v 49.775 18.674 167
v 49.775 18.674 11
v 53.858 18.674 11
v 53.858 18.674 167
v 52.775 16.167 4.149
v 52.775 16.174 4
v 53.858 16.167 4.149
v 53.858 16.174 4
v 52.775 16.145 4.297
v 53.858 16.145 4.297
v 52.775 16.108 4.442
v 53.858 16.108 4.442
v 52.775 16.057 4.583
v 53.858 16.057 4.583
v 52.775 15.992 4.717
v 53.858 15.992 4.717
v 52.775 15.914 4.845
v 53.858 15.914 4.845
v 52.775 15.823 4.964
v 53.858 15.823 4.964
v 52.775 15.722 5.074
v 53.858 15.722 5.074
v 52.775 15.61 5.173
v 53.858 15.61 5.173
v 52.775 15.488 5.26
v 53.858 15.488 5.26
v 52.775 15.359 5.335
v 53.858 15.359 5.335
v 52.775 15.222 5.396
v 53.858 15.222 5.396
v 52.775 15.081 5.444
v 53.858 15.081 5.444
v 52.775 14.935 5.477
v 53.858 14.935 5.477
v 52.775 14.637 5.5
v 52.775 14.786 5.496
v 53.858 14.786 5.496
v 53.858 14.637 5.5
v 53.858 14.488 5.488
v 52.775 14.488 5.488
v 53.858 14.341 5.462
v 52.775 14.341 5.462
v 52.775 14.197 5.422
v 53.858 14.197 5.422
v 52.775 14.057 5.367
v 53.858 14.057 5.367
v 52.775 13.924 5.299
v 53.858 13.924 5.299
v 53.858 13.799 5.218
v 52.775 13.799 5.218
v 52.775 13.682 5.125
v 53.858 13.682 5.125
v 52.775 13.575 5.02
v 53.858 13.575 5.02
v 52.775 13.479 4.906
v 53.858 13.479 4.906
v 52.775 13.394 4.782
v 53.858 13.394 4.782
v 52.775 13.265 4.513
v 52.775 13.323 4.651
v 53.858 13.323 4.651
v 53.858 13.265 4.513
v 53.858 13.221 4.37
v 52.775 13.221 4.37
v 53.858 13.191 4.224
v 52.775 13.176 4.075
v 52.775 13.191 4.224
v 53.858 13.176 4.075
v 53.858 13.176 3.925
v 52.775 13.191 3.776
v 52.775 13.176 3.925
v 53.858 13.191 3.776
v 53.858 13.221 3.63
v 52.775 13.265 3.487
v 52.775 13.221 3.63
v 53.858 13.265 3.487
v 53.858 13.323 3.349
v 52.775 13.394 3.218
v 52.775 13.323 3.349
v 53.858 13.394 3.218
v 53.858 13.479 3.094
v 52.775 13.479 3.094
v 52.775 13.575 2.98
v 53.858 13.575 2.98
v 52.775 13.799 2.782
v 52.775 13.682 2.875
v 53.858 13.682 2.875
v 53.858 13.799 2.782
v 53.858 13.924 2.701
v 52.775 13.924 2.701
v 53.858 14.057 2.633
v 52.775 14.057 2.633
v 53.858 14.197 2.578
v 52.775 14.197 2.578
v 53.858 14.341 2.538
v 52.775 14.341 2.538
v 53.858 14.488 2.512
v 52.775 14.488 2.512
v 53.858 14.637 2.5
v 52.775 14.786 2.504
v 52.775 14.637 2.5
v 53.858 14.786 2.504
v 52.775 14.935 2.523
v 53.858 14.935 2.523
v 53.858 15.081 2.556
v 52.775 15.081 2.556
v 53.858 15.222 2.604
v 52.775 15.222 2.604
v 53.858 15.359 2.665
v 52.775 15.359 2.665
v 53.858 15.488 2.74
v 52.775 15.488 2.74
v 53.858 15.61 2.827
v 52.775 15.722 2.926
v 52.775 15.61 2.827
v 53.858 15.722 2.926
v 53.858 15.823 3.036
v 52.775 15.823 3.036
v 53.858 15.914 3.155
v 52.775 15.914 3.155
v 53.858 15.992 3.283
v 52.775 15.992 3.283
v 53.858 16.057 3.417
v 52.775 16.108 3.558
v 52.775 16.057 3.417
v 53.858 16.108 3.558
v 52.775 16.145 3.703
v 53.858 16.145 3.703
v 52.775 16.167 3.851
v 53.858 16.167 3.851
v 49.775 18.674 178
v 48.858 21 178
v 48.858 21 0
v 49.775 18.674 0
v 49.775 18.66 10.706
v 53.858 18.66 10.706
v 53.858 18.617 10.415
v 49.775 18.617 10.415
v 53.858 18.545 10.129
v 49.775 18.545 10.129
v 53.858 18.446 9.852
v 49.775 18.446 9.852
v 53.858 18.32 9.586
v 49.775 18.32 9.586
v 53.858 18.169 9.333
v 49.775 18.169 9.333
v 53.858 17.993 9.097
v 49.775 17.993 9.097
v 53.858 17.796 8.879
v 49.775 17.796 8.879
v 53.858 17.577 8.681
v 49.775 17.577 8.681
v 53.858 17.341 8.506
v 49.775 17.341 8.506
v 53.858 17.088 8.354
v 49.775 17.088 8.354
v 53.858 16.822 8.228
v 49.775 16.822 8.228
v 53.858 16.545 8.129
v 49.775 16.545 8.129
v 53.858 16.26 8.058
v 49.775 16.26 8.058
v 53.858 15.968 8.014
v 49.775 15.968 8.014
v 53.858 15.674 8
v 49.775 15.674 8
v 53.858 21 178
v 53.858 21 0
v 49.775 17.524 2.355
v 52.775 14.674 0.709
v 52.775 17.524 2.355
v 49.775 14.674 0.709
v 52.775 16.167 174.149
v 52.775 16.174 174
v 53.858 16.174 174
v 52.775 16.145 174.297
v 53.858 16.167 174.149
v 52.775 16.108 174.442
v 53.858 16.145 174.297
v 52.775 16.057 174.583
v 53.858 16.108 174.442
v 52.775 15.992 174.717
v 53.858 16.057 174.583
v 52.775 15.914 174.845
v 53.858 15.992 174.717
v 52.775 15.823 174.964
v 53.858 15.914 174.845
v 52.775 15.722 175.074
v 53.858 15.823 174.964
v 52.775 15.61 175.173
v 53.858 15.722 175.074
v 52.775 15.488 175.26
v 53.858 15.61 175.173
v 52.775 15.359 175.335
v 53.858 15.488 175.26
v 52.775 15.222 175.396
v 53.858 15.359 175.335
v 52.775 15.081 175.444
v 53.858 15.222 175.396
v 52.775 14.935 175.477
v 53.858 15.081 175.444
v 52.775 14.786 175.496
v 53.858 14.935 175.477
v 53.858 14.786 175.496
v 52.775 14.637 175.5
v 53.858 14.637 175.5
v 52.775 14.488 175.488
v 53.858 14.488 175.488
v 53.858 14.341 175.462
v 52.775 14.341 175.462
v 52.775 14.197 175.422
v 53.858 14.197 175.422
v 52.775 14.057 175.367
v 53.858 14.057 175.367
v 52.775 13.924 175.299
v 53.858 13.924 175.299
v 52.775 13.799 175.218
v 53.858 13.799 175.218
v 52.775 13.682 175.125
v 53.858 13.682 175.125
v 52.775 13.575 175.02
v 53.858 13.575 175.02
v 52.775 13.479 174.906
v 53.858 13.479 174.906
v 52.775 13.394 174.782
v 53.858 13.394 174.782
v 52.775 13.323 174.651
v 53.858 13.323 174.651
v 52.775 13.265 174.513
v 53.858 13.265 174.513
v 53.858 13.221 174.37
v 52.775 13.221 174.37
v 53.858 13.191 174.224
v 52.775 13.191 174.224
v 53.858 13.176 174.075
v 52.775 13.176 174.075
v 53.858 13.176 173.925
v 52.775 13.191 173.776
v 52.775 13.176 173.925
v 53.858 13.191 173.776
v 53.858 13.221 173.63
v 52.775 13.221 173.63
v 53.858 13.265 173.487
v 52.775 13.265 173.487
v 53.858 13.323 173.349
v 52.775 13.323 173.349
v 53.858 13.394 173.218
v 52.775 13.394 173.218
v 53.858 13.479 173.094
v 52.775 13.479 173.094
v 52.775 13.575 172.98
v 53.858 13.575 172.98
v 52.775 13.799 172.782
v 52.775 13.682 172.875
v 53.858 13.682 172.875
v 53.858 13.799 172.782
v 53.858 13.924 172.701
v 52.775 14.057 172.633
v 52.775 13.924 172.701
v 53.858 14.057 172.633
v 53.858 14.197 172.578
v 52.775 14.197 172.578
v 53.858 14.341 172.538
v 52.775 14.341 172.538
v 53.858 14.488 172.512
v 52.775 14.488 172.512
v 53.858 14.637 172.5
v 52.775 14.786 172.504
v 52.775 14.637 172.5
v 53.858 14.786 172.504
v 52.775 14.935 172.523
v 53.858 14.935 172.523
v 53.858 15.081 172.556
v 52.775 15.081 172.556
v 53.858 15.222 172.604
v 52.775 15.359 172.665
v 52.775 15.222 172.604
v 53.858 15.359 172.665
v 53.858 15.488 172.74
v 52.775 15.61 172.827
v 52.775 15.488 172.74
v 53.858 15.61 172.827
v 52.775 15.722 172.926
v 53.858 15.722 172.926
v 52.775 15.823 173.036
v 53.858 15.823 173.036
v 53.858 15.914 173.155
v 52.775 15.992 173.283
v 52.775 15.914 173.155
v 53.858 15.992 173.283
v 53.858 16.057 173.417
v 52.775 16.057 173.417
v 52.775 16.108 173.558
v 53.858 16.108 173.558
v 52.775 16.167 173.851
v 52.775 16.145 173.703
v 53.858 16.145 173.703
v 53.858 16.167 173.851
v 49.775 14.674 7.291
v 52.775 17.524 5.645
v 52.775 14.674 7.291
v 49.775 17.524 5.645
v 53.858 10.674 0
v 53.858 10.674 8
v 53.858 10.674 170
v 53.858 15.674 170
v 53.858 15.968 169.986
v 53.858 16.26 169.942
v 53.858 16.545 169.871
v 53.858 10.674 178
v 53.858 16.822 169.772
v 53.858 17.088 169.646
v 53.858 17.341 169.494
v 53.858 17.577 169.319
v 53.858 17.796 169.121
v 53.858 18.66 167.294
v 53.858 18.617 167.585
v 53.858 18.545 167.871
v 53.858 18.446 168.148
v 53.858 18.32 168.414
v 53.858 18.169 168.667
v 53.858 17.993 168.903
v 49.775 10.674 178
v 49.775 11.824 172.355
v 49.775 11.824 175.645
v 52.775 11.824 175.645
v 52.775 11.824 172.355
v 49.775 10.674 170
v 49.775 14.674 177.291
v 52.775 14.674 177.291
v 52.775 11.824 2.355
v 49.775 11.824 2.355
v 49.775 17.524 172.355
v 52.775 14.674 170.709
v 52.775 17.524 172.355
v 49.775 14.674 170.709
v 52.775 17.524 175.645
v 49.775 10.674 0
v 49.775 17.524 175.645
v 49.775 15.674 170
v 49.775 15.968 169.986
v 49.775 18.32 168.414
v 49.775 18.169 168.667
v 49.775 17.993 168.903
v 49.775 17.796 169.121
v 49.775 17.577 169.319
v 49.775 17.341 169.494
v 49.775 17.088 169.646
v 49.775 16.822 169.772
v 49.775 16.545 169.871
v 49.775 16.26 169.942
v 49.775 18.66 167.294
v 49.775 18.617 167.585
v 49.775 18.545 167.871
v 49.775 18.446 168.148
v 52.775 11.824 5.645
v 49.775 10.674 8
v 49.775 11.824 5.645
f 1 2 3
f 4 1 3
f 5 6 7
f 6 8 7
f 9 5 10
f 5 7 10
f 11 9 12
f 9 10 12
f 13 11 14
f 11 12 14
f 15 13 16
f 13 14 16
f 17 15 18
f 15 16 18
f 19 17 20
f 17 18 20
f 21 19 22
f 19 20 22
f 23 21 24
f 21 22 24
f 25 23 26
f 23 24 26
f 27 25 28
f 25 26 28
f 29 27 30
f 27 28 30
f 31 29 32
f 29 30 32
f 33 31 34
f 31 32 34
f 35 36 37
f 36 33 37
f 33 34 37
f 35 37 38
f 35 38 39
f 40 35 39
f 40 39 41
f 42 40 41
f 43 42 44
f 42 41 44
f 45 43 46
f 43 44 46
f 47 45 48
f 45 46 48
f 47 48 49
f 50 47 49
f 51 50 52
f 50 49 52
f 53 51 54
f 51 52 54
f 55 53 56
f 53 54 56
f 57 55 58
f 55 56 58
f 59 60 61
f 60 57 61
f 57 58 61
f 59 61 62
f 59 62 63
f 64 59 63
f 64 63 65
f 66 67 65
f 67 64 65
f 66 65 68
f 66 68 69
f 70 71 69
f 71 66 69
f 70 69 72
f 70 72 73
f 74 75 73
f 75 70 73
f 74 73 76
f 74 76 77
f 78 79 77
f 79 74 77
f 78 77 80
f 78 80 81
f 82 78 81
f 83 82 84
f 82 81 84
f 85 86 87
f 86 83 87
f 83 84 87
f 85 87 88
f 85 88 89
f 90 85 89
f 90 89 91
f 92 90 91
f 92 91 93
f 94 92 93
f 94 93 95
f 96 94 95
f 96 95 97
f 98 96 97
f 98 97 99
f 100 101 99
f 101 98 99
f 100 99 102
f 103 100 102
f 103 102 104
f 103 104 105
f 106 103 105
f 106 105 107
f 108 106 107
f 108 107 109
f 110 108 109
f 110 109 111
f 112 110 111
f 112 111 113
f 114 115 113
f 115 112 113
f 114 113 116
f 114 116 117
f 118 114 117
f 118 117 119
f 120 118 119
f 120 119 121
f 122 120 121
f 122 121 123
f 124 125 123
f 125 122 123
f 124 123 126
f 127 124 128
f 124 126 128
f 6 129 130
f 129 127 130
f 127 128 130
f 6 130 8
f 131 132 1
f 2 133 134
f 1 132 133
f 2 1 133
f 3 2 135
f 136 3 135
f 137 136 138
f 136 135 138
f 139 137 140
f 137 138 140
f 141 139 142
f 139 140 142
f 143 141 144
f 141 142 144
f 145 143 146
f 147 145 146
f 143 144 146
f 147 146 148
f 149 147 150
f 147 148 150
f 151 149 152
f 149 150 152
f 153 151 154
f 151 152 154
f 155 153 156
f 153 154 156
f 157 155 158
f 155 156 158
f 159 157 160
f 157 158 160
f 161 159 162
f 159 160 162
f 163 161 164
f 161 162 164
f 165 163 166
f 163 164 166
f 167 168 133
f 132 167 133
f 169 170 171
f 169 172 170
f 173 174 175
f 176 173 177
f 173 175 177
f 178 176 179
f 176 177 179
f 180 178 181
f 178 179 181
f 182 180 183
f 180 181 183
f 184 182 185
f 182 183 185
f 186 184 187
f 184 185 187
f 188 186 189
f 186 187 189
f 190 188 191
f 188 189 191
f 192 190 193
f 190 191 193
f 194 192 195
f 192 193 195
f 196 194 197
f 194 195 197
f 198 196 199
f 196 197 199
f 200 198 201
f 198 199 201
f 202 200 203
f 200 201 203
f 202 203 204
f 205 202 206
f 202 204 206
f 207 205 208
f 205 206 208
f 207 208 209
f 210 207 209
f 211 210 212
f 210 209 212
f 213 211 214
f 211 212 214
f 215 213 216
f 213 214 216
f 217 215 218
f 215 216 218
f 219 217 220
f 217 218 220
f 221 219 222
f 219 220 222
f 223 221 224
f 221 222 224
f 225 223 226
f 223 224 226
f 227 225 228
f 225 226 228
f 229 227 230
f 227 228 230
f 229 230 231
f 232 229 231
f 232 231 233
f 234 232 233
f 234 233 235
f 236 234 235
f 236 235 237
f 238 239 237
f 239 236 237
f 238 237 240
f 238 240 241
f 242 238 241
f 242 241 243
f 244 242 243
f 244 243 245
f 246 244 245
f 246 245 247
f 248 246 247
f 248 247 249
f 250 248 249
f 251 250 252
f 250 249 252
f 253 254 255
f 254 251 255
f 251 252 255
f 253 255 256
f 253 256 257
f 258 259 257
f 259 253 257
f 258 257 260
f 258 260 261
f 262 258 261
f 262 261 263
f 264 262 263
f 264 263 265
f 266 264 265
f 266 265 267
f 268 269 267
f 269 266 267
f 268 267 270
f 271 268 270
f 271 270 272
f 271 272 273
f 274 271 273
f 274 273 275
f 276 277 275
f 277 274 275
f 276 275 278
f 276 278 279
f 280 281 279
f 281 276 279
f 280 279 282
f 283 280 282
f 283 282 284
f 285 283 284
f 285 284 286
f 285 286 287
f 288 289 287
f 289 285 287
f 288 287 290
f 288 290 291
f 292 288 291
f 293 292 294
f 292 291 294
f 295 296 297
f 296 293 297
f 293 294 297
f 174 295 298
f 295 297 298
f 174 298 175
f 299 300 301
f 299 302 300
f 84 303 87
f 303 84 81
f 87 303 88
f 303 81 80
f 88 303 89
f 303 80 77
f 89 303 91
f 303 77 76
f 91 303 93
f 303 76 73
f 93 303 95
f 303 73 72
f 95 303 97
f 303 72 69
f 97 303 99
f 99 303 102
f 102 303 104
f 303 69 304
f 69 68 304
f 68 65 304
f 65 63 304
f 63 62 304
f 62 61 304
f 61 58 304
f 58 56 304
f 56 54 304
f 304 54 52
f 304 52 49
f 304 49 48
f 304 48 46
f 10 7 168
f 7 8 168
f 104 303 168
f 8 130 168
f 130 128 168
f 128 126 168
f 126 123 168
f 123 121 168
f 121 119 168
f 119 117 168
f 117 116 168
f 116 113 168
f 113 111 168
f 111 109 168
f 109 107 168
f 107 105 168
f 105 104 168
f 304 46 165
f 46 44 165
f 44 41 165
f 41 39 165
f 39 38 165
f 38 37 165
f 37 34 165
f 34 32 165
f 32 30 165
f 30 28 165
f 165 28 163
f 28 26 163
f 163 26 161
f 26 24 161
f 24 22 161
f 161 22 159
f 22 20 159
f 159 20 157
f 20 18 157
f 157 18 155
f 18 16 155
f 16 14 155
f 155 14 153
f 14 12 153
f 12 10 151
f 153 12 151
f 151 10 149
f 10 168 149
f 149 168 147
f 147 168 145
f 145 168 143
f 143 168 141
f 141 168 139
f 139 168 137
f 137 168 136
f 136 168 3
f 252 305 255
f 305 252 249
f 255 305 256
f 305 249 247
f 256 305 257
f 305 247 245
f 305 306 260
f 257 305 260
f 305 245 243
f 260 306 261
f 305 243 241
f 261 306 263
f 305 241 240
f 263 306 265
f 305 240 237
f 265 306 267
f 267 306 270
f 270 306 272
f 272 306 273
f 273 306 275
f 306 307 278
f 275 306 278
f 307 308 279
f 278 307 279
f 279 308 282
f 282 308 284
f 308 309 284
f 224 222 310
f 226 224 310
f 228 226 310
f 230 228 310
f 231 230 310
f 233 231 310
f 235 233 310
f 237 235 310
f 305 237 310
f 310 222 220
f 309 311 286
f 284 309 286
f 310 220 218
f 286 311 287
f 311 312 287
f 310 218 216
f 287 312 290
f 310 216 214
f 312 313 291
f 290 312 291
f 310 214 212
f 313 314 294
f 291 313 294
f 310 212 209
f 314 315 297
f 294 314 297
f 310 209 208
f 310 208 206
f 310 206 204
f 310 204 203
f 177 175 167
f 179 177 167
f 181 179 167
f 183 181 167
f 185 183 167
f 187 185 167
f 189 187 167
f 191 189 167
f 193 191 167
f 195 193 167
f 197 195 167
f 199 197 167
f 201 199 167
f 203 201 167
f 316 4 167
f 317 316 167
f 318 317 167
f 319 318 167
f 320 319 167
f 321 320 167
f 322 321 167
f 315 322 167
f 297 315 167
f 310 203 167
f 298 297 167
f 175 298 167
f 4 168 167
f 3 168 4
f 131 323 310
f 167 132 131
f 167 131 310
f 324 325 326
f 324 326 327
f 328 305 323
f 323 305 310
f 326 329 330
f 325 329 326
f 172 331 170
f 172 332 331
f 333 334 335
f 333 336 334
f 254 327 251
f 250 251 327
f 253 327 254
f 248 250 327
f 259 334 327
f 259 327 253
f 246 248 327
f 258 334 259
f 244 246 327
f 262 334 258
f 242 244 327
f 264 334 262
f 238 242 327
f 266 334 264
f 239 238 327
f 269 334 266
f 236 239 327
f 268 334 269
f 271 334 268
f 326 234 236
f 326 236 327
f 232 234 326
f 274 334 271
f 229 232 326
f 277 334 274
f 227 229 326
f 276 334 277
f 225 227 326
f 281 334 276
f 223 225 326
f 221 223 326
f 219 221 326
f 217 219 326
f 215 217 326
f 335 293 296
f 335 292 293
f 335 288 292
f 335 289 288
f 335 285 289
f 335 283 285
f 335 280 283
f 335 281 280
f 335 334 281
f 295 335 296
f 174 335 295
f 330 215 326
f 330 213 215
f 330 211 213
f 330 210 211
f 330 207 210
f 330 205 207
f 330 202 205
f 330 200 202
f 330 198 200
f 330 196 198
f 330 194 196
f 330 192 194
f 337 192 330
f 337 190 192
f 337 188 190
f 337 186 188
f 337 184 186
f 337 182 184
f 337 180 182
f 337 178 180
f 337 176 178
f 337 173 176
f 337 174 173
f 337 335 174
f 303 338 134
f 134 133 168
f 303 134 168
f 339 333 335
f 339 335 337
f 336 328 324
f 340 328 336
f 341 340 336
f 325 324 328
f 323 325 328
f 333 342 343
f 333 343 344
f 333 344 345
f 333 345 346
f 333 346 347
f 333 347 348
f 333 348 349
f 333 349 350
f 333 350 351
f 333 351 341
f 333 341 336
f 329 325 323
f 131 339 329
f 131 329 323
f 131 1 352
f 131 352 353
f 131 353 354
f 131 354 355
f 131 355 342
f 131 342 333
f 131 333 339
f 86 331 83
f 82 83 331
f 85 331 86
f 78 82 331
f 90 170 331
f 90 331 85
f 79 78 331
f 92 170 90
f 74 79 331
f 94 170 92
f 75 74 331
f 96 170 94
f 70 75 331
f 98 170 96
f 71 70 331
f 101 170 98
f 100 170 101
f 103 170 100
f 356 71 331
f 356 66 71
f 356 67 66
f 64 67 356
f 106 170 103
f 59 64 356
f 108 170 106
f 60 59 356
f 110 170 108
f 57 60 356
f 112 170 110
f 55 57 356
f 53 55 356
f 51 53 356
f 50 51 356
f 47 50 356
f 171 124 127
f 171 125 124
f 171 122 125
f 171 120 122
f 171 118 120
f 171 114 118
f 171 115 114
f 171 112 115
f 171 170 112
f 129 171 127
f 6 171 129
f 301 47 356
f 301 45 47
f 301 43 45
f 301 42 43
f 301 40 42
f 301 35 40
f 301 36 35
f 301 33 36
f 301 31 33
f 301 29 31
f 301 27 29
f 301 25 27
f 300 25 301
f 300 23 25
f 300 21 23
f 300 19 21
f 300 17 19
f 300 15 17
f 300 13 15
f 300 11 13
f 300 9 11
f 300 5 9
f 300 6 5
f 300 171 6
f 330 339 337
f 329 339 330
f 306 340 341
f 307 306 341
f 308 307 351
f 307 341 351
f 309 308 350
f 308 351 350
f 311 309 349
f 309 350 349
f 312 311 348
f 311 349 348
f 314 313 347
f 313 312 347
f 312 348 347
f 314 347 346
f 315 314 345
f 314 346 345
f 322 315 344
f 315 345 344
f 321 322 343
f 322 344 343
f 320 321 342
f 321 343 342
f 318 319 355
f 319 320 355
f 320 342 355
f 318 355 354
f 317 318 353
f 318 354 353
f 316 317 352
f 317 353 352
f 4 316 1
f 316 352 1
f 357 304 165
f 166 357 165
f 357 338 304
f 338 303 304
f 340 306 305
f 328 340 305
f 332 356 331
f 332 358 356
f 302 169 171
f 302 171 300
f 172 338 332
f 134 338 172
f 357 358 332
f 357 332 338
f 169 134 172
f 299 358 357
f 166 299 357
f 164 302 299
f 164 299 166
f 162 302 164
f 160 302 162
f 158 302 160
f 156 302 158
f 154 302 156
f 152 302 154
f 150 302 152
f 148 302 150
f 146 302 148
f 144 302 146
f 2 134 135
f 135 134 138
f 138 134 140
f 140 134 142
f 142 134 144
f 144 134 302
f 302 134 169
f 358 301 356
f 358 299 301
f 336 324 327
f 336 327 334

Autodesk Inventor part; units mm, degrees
ref_plane "YZ Plane" through (0, 0, 0) normal (1, 0, 0) x (0, 1, 0)
ref_plane "XZ Plane" through (0, 0, 0) normal (0, 1, 0) x (-1, 0, 0)
sketch "スケッチ1" plane through (0, 0, 0) normal (0, 0, 1) x (1, 0, 0)
  line L0 (-53.8577, -21) -> (53.8577, -21) projected
  line L1 (53.8577, -21) -> (53.8577, 21) projected
  line L2 (53.8577, 21) -> (48.8577, 21) projected
  line L3 (48.8577, 21) -> (49.7747, 18.6743) projected
  line L4 (49.7747, 18.6743) -> (-44.506, -18.5) projected
  line L5 (-44.506, -18.5) -> (-45.423, -16.1743) projected
  line L6 (-45.423, -16.1743) -> (-53.8577, -19.5) projected
  line L7 (-53.8577, -19.5) -> (-53.8577, -21) projected
  line L8 (-14.7433, -12.1394) -> (42.0411, 10.2503) projected
  arc A0 (44.7747, 8.3897) -> (42.0411, 10.2503) centre (42.7747, 8.3897) ccw projected
  line L9 (44.7747, 8.3897) -> (44.7747, -14) projected
  arc A1 (42.7747, -16) -> (44.7747, -14) centre (42.7747, -14) ccw projected
  line L10 (42.7747, -16) -> (-14.0097, -16) projected
  arc A2 (-14.7433, -12.1394) -> (-14.0097, -16) centre (-14.0097, -14) ccw projected
  line L11 (49.7747, 18.6743) -> (53.8577, 18.6743)
  point P0 (0, 0)
ref_plane "作業平面1" through (-53.8577, -21, 178) normal (0, 0, -1) x (0, 1, 0)
extrude "押し出し1" add sketch "スケッチ1" along normal up to surface (178 mm away) contours L11 L3 L2 L1
ref_plane "作業平面2" through (53.8577, 21, -10) normal (-1, 0, 0) x (0, 1, 0)
sketch "スケッチ3" plane through (53.8577, 21, -10) normal (-1, 0, 0) x (0, 1, 0)
  line L0 (-2.3257, -10) -> (-2.3257, -188) projected
  line L1 (-2.3257, -10) -> (0, -10) projected
  line L2 (-2.3257, -10) -> (-10.3257, -10)
  line L3 (-10.3257, -10) -> (-10.3257, -18)
  line L4 (-10.3257, -18) -> (-2.3257, -18)
  line L5 (-2.3257, -18) -> (-2.3257, -10)
  circle A0 centre (-6.3257, -14) radius 1.5
  line L6 (-3.4757, -15.6454) -> (-6.3257, -17.2909)
  line L7 (-6.3257, -17.2909) -> (-9.1757, -15.6454)
  line L8 (-9.1757, -15.6454) -> (-9.1757, -12.3546)
  line L9 (-9.1757, -12.3546) -> (-6.3257, -10.7091)
  line L10 (-6.3257, -10.7091) -> (-3.4757, -12.3546)
  line L11 (-3.4757, -12.3546) -> (-3.4757, -15.6454)
  point P0 (-21, -10)
  dimension "d5" = 8
  dimension "d6" = 8
  dimension "d7" = 3
  dimension "d8" = 5.7
extrude "押し出し2" add sketch "スケッチ3" along normal blind 4.083 contours L0 L4 L3 L2 | L6 L7 L8 L9 L10 L11
ref_plane "作業平面4" through (49.7747, 18.6743, 0) normal (1, 0, 0) x (0, 0, -1)
sketch "スケッチ4" plane through (49.7747, 21, -10) normal (-1, 0, 0) x (0, 0, 1)
  circle A0 centre (14, -6.3257) radius 1.5 projected
  line L0 (12.3546, -9.1757) -> (10.7091, -6.3257)
  line L1 (10.7091, -6.3257) -> (12.3546, -3.4757)
  line L2 (12.3546, -3.4757) -> (15.6454, -3.4757)
  line L3 (15.6454, -3.4757) -> (17.2909, -6.3257)
  line L4 (17.2909, -6.3257) -> (15.6454, -9.1757)
  line L5 (15.6454, -9.1757) -> (12.3546, -9.1757)
  point P0 (10, -21)
  point P1 (14, -3.4757)
  point P2 (14, -9.1757)
  dimension "d11" = 5.7
extrude "押し出し3" cut sketch "スケッチ4" against normal blind 3
sketch "スケッチ5" plane through (49.7747, 21, -10) normal (-1, 0, 0) x (0, 0, 1)
  line L0 (18, -2.3257) -> (10, -2.3257) projected
  line L1 (18, -2.3257) -> (188, -2.3257) projected
  line L2 (18, -10.3257) -> (18, -2.3257) projected
  line L3 (18, -2.3257) -> (21, -2.3257)
  line L4 (21, -2.3257) -> (21, -5.3257)
  line L5 (21, -5.3257) -> (18, -5.3257)
  line L6 (18, -5.3257) -> (18, -2.3257)
  arc A0 (21, -2.3257) -> (18, -5.3257) centre (21, -5.3257) ccw
  point P0 (10, -21)
  point P1 (21, -2.3257)
  dimension "d14" = 3
  dimension "d15" = 3
extrude "押し出し4" add sketch "スケッチ5" against normal blind 4.083 contours L1 A0 L2
ref_plane "作業平面5" through (48.8577, 21, 89) normal (0, 0, 1) x (1, 0, 0)
mirror "ミラー1" about plane through (48.8577, 21, 89) normal (0, 0, 1) of "押し出し2", "押し出し4"
mirror "ミラー2" about plane through (48.8577, 21, 89) normal (0, 0, 1) of "押し出し3"
ref_plane "作業平面6" through (48.8577, 21, 89) normal (0, 0, 1) x (1, 0, 0)
equation "\"d6\" = d5"
properties part number "Spcer_Upper"
